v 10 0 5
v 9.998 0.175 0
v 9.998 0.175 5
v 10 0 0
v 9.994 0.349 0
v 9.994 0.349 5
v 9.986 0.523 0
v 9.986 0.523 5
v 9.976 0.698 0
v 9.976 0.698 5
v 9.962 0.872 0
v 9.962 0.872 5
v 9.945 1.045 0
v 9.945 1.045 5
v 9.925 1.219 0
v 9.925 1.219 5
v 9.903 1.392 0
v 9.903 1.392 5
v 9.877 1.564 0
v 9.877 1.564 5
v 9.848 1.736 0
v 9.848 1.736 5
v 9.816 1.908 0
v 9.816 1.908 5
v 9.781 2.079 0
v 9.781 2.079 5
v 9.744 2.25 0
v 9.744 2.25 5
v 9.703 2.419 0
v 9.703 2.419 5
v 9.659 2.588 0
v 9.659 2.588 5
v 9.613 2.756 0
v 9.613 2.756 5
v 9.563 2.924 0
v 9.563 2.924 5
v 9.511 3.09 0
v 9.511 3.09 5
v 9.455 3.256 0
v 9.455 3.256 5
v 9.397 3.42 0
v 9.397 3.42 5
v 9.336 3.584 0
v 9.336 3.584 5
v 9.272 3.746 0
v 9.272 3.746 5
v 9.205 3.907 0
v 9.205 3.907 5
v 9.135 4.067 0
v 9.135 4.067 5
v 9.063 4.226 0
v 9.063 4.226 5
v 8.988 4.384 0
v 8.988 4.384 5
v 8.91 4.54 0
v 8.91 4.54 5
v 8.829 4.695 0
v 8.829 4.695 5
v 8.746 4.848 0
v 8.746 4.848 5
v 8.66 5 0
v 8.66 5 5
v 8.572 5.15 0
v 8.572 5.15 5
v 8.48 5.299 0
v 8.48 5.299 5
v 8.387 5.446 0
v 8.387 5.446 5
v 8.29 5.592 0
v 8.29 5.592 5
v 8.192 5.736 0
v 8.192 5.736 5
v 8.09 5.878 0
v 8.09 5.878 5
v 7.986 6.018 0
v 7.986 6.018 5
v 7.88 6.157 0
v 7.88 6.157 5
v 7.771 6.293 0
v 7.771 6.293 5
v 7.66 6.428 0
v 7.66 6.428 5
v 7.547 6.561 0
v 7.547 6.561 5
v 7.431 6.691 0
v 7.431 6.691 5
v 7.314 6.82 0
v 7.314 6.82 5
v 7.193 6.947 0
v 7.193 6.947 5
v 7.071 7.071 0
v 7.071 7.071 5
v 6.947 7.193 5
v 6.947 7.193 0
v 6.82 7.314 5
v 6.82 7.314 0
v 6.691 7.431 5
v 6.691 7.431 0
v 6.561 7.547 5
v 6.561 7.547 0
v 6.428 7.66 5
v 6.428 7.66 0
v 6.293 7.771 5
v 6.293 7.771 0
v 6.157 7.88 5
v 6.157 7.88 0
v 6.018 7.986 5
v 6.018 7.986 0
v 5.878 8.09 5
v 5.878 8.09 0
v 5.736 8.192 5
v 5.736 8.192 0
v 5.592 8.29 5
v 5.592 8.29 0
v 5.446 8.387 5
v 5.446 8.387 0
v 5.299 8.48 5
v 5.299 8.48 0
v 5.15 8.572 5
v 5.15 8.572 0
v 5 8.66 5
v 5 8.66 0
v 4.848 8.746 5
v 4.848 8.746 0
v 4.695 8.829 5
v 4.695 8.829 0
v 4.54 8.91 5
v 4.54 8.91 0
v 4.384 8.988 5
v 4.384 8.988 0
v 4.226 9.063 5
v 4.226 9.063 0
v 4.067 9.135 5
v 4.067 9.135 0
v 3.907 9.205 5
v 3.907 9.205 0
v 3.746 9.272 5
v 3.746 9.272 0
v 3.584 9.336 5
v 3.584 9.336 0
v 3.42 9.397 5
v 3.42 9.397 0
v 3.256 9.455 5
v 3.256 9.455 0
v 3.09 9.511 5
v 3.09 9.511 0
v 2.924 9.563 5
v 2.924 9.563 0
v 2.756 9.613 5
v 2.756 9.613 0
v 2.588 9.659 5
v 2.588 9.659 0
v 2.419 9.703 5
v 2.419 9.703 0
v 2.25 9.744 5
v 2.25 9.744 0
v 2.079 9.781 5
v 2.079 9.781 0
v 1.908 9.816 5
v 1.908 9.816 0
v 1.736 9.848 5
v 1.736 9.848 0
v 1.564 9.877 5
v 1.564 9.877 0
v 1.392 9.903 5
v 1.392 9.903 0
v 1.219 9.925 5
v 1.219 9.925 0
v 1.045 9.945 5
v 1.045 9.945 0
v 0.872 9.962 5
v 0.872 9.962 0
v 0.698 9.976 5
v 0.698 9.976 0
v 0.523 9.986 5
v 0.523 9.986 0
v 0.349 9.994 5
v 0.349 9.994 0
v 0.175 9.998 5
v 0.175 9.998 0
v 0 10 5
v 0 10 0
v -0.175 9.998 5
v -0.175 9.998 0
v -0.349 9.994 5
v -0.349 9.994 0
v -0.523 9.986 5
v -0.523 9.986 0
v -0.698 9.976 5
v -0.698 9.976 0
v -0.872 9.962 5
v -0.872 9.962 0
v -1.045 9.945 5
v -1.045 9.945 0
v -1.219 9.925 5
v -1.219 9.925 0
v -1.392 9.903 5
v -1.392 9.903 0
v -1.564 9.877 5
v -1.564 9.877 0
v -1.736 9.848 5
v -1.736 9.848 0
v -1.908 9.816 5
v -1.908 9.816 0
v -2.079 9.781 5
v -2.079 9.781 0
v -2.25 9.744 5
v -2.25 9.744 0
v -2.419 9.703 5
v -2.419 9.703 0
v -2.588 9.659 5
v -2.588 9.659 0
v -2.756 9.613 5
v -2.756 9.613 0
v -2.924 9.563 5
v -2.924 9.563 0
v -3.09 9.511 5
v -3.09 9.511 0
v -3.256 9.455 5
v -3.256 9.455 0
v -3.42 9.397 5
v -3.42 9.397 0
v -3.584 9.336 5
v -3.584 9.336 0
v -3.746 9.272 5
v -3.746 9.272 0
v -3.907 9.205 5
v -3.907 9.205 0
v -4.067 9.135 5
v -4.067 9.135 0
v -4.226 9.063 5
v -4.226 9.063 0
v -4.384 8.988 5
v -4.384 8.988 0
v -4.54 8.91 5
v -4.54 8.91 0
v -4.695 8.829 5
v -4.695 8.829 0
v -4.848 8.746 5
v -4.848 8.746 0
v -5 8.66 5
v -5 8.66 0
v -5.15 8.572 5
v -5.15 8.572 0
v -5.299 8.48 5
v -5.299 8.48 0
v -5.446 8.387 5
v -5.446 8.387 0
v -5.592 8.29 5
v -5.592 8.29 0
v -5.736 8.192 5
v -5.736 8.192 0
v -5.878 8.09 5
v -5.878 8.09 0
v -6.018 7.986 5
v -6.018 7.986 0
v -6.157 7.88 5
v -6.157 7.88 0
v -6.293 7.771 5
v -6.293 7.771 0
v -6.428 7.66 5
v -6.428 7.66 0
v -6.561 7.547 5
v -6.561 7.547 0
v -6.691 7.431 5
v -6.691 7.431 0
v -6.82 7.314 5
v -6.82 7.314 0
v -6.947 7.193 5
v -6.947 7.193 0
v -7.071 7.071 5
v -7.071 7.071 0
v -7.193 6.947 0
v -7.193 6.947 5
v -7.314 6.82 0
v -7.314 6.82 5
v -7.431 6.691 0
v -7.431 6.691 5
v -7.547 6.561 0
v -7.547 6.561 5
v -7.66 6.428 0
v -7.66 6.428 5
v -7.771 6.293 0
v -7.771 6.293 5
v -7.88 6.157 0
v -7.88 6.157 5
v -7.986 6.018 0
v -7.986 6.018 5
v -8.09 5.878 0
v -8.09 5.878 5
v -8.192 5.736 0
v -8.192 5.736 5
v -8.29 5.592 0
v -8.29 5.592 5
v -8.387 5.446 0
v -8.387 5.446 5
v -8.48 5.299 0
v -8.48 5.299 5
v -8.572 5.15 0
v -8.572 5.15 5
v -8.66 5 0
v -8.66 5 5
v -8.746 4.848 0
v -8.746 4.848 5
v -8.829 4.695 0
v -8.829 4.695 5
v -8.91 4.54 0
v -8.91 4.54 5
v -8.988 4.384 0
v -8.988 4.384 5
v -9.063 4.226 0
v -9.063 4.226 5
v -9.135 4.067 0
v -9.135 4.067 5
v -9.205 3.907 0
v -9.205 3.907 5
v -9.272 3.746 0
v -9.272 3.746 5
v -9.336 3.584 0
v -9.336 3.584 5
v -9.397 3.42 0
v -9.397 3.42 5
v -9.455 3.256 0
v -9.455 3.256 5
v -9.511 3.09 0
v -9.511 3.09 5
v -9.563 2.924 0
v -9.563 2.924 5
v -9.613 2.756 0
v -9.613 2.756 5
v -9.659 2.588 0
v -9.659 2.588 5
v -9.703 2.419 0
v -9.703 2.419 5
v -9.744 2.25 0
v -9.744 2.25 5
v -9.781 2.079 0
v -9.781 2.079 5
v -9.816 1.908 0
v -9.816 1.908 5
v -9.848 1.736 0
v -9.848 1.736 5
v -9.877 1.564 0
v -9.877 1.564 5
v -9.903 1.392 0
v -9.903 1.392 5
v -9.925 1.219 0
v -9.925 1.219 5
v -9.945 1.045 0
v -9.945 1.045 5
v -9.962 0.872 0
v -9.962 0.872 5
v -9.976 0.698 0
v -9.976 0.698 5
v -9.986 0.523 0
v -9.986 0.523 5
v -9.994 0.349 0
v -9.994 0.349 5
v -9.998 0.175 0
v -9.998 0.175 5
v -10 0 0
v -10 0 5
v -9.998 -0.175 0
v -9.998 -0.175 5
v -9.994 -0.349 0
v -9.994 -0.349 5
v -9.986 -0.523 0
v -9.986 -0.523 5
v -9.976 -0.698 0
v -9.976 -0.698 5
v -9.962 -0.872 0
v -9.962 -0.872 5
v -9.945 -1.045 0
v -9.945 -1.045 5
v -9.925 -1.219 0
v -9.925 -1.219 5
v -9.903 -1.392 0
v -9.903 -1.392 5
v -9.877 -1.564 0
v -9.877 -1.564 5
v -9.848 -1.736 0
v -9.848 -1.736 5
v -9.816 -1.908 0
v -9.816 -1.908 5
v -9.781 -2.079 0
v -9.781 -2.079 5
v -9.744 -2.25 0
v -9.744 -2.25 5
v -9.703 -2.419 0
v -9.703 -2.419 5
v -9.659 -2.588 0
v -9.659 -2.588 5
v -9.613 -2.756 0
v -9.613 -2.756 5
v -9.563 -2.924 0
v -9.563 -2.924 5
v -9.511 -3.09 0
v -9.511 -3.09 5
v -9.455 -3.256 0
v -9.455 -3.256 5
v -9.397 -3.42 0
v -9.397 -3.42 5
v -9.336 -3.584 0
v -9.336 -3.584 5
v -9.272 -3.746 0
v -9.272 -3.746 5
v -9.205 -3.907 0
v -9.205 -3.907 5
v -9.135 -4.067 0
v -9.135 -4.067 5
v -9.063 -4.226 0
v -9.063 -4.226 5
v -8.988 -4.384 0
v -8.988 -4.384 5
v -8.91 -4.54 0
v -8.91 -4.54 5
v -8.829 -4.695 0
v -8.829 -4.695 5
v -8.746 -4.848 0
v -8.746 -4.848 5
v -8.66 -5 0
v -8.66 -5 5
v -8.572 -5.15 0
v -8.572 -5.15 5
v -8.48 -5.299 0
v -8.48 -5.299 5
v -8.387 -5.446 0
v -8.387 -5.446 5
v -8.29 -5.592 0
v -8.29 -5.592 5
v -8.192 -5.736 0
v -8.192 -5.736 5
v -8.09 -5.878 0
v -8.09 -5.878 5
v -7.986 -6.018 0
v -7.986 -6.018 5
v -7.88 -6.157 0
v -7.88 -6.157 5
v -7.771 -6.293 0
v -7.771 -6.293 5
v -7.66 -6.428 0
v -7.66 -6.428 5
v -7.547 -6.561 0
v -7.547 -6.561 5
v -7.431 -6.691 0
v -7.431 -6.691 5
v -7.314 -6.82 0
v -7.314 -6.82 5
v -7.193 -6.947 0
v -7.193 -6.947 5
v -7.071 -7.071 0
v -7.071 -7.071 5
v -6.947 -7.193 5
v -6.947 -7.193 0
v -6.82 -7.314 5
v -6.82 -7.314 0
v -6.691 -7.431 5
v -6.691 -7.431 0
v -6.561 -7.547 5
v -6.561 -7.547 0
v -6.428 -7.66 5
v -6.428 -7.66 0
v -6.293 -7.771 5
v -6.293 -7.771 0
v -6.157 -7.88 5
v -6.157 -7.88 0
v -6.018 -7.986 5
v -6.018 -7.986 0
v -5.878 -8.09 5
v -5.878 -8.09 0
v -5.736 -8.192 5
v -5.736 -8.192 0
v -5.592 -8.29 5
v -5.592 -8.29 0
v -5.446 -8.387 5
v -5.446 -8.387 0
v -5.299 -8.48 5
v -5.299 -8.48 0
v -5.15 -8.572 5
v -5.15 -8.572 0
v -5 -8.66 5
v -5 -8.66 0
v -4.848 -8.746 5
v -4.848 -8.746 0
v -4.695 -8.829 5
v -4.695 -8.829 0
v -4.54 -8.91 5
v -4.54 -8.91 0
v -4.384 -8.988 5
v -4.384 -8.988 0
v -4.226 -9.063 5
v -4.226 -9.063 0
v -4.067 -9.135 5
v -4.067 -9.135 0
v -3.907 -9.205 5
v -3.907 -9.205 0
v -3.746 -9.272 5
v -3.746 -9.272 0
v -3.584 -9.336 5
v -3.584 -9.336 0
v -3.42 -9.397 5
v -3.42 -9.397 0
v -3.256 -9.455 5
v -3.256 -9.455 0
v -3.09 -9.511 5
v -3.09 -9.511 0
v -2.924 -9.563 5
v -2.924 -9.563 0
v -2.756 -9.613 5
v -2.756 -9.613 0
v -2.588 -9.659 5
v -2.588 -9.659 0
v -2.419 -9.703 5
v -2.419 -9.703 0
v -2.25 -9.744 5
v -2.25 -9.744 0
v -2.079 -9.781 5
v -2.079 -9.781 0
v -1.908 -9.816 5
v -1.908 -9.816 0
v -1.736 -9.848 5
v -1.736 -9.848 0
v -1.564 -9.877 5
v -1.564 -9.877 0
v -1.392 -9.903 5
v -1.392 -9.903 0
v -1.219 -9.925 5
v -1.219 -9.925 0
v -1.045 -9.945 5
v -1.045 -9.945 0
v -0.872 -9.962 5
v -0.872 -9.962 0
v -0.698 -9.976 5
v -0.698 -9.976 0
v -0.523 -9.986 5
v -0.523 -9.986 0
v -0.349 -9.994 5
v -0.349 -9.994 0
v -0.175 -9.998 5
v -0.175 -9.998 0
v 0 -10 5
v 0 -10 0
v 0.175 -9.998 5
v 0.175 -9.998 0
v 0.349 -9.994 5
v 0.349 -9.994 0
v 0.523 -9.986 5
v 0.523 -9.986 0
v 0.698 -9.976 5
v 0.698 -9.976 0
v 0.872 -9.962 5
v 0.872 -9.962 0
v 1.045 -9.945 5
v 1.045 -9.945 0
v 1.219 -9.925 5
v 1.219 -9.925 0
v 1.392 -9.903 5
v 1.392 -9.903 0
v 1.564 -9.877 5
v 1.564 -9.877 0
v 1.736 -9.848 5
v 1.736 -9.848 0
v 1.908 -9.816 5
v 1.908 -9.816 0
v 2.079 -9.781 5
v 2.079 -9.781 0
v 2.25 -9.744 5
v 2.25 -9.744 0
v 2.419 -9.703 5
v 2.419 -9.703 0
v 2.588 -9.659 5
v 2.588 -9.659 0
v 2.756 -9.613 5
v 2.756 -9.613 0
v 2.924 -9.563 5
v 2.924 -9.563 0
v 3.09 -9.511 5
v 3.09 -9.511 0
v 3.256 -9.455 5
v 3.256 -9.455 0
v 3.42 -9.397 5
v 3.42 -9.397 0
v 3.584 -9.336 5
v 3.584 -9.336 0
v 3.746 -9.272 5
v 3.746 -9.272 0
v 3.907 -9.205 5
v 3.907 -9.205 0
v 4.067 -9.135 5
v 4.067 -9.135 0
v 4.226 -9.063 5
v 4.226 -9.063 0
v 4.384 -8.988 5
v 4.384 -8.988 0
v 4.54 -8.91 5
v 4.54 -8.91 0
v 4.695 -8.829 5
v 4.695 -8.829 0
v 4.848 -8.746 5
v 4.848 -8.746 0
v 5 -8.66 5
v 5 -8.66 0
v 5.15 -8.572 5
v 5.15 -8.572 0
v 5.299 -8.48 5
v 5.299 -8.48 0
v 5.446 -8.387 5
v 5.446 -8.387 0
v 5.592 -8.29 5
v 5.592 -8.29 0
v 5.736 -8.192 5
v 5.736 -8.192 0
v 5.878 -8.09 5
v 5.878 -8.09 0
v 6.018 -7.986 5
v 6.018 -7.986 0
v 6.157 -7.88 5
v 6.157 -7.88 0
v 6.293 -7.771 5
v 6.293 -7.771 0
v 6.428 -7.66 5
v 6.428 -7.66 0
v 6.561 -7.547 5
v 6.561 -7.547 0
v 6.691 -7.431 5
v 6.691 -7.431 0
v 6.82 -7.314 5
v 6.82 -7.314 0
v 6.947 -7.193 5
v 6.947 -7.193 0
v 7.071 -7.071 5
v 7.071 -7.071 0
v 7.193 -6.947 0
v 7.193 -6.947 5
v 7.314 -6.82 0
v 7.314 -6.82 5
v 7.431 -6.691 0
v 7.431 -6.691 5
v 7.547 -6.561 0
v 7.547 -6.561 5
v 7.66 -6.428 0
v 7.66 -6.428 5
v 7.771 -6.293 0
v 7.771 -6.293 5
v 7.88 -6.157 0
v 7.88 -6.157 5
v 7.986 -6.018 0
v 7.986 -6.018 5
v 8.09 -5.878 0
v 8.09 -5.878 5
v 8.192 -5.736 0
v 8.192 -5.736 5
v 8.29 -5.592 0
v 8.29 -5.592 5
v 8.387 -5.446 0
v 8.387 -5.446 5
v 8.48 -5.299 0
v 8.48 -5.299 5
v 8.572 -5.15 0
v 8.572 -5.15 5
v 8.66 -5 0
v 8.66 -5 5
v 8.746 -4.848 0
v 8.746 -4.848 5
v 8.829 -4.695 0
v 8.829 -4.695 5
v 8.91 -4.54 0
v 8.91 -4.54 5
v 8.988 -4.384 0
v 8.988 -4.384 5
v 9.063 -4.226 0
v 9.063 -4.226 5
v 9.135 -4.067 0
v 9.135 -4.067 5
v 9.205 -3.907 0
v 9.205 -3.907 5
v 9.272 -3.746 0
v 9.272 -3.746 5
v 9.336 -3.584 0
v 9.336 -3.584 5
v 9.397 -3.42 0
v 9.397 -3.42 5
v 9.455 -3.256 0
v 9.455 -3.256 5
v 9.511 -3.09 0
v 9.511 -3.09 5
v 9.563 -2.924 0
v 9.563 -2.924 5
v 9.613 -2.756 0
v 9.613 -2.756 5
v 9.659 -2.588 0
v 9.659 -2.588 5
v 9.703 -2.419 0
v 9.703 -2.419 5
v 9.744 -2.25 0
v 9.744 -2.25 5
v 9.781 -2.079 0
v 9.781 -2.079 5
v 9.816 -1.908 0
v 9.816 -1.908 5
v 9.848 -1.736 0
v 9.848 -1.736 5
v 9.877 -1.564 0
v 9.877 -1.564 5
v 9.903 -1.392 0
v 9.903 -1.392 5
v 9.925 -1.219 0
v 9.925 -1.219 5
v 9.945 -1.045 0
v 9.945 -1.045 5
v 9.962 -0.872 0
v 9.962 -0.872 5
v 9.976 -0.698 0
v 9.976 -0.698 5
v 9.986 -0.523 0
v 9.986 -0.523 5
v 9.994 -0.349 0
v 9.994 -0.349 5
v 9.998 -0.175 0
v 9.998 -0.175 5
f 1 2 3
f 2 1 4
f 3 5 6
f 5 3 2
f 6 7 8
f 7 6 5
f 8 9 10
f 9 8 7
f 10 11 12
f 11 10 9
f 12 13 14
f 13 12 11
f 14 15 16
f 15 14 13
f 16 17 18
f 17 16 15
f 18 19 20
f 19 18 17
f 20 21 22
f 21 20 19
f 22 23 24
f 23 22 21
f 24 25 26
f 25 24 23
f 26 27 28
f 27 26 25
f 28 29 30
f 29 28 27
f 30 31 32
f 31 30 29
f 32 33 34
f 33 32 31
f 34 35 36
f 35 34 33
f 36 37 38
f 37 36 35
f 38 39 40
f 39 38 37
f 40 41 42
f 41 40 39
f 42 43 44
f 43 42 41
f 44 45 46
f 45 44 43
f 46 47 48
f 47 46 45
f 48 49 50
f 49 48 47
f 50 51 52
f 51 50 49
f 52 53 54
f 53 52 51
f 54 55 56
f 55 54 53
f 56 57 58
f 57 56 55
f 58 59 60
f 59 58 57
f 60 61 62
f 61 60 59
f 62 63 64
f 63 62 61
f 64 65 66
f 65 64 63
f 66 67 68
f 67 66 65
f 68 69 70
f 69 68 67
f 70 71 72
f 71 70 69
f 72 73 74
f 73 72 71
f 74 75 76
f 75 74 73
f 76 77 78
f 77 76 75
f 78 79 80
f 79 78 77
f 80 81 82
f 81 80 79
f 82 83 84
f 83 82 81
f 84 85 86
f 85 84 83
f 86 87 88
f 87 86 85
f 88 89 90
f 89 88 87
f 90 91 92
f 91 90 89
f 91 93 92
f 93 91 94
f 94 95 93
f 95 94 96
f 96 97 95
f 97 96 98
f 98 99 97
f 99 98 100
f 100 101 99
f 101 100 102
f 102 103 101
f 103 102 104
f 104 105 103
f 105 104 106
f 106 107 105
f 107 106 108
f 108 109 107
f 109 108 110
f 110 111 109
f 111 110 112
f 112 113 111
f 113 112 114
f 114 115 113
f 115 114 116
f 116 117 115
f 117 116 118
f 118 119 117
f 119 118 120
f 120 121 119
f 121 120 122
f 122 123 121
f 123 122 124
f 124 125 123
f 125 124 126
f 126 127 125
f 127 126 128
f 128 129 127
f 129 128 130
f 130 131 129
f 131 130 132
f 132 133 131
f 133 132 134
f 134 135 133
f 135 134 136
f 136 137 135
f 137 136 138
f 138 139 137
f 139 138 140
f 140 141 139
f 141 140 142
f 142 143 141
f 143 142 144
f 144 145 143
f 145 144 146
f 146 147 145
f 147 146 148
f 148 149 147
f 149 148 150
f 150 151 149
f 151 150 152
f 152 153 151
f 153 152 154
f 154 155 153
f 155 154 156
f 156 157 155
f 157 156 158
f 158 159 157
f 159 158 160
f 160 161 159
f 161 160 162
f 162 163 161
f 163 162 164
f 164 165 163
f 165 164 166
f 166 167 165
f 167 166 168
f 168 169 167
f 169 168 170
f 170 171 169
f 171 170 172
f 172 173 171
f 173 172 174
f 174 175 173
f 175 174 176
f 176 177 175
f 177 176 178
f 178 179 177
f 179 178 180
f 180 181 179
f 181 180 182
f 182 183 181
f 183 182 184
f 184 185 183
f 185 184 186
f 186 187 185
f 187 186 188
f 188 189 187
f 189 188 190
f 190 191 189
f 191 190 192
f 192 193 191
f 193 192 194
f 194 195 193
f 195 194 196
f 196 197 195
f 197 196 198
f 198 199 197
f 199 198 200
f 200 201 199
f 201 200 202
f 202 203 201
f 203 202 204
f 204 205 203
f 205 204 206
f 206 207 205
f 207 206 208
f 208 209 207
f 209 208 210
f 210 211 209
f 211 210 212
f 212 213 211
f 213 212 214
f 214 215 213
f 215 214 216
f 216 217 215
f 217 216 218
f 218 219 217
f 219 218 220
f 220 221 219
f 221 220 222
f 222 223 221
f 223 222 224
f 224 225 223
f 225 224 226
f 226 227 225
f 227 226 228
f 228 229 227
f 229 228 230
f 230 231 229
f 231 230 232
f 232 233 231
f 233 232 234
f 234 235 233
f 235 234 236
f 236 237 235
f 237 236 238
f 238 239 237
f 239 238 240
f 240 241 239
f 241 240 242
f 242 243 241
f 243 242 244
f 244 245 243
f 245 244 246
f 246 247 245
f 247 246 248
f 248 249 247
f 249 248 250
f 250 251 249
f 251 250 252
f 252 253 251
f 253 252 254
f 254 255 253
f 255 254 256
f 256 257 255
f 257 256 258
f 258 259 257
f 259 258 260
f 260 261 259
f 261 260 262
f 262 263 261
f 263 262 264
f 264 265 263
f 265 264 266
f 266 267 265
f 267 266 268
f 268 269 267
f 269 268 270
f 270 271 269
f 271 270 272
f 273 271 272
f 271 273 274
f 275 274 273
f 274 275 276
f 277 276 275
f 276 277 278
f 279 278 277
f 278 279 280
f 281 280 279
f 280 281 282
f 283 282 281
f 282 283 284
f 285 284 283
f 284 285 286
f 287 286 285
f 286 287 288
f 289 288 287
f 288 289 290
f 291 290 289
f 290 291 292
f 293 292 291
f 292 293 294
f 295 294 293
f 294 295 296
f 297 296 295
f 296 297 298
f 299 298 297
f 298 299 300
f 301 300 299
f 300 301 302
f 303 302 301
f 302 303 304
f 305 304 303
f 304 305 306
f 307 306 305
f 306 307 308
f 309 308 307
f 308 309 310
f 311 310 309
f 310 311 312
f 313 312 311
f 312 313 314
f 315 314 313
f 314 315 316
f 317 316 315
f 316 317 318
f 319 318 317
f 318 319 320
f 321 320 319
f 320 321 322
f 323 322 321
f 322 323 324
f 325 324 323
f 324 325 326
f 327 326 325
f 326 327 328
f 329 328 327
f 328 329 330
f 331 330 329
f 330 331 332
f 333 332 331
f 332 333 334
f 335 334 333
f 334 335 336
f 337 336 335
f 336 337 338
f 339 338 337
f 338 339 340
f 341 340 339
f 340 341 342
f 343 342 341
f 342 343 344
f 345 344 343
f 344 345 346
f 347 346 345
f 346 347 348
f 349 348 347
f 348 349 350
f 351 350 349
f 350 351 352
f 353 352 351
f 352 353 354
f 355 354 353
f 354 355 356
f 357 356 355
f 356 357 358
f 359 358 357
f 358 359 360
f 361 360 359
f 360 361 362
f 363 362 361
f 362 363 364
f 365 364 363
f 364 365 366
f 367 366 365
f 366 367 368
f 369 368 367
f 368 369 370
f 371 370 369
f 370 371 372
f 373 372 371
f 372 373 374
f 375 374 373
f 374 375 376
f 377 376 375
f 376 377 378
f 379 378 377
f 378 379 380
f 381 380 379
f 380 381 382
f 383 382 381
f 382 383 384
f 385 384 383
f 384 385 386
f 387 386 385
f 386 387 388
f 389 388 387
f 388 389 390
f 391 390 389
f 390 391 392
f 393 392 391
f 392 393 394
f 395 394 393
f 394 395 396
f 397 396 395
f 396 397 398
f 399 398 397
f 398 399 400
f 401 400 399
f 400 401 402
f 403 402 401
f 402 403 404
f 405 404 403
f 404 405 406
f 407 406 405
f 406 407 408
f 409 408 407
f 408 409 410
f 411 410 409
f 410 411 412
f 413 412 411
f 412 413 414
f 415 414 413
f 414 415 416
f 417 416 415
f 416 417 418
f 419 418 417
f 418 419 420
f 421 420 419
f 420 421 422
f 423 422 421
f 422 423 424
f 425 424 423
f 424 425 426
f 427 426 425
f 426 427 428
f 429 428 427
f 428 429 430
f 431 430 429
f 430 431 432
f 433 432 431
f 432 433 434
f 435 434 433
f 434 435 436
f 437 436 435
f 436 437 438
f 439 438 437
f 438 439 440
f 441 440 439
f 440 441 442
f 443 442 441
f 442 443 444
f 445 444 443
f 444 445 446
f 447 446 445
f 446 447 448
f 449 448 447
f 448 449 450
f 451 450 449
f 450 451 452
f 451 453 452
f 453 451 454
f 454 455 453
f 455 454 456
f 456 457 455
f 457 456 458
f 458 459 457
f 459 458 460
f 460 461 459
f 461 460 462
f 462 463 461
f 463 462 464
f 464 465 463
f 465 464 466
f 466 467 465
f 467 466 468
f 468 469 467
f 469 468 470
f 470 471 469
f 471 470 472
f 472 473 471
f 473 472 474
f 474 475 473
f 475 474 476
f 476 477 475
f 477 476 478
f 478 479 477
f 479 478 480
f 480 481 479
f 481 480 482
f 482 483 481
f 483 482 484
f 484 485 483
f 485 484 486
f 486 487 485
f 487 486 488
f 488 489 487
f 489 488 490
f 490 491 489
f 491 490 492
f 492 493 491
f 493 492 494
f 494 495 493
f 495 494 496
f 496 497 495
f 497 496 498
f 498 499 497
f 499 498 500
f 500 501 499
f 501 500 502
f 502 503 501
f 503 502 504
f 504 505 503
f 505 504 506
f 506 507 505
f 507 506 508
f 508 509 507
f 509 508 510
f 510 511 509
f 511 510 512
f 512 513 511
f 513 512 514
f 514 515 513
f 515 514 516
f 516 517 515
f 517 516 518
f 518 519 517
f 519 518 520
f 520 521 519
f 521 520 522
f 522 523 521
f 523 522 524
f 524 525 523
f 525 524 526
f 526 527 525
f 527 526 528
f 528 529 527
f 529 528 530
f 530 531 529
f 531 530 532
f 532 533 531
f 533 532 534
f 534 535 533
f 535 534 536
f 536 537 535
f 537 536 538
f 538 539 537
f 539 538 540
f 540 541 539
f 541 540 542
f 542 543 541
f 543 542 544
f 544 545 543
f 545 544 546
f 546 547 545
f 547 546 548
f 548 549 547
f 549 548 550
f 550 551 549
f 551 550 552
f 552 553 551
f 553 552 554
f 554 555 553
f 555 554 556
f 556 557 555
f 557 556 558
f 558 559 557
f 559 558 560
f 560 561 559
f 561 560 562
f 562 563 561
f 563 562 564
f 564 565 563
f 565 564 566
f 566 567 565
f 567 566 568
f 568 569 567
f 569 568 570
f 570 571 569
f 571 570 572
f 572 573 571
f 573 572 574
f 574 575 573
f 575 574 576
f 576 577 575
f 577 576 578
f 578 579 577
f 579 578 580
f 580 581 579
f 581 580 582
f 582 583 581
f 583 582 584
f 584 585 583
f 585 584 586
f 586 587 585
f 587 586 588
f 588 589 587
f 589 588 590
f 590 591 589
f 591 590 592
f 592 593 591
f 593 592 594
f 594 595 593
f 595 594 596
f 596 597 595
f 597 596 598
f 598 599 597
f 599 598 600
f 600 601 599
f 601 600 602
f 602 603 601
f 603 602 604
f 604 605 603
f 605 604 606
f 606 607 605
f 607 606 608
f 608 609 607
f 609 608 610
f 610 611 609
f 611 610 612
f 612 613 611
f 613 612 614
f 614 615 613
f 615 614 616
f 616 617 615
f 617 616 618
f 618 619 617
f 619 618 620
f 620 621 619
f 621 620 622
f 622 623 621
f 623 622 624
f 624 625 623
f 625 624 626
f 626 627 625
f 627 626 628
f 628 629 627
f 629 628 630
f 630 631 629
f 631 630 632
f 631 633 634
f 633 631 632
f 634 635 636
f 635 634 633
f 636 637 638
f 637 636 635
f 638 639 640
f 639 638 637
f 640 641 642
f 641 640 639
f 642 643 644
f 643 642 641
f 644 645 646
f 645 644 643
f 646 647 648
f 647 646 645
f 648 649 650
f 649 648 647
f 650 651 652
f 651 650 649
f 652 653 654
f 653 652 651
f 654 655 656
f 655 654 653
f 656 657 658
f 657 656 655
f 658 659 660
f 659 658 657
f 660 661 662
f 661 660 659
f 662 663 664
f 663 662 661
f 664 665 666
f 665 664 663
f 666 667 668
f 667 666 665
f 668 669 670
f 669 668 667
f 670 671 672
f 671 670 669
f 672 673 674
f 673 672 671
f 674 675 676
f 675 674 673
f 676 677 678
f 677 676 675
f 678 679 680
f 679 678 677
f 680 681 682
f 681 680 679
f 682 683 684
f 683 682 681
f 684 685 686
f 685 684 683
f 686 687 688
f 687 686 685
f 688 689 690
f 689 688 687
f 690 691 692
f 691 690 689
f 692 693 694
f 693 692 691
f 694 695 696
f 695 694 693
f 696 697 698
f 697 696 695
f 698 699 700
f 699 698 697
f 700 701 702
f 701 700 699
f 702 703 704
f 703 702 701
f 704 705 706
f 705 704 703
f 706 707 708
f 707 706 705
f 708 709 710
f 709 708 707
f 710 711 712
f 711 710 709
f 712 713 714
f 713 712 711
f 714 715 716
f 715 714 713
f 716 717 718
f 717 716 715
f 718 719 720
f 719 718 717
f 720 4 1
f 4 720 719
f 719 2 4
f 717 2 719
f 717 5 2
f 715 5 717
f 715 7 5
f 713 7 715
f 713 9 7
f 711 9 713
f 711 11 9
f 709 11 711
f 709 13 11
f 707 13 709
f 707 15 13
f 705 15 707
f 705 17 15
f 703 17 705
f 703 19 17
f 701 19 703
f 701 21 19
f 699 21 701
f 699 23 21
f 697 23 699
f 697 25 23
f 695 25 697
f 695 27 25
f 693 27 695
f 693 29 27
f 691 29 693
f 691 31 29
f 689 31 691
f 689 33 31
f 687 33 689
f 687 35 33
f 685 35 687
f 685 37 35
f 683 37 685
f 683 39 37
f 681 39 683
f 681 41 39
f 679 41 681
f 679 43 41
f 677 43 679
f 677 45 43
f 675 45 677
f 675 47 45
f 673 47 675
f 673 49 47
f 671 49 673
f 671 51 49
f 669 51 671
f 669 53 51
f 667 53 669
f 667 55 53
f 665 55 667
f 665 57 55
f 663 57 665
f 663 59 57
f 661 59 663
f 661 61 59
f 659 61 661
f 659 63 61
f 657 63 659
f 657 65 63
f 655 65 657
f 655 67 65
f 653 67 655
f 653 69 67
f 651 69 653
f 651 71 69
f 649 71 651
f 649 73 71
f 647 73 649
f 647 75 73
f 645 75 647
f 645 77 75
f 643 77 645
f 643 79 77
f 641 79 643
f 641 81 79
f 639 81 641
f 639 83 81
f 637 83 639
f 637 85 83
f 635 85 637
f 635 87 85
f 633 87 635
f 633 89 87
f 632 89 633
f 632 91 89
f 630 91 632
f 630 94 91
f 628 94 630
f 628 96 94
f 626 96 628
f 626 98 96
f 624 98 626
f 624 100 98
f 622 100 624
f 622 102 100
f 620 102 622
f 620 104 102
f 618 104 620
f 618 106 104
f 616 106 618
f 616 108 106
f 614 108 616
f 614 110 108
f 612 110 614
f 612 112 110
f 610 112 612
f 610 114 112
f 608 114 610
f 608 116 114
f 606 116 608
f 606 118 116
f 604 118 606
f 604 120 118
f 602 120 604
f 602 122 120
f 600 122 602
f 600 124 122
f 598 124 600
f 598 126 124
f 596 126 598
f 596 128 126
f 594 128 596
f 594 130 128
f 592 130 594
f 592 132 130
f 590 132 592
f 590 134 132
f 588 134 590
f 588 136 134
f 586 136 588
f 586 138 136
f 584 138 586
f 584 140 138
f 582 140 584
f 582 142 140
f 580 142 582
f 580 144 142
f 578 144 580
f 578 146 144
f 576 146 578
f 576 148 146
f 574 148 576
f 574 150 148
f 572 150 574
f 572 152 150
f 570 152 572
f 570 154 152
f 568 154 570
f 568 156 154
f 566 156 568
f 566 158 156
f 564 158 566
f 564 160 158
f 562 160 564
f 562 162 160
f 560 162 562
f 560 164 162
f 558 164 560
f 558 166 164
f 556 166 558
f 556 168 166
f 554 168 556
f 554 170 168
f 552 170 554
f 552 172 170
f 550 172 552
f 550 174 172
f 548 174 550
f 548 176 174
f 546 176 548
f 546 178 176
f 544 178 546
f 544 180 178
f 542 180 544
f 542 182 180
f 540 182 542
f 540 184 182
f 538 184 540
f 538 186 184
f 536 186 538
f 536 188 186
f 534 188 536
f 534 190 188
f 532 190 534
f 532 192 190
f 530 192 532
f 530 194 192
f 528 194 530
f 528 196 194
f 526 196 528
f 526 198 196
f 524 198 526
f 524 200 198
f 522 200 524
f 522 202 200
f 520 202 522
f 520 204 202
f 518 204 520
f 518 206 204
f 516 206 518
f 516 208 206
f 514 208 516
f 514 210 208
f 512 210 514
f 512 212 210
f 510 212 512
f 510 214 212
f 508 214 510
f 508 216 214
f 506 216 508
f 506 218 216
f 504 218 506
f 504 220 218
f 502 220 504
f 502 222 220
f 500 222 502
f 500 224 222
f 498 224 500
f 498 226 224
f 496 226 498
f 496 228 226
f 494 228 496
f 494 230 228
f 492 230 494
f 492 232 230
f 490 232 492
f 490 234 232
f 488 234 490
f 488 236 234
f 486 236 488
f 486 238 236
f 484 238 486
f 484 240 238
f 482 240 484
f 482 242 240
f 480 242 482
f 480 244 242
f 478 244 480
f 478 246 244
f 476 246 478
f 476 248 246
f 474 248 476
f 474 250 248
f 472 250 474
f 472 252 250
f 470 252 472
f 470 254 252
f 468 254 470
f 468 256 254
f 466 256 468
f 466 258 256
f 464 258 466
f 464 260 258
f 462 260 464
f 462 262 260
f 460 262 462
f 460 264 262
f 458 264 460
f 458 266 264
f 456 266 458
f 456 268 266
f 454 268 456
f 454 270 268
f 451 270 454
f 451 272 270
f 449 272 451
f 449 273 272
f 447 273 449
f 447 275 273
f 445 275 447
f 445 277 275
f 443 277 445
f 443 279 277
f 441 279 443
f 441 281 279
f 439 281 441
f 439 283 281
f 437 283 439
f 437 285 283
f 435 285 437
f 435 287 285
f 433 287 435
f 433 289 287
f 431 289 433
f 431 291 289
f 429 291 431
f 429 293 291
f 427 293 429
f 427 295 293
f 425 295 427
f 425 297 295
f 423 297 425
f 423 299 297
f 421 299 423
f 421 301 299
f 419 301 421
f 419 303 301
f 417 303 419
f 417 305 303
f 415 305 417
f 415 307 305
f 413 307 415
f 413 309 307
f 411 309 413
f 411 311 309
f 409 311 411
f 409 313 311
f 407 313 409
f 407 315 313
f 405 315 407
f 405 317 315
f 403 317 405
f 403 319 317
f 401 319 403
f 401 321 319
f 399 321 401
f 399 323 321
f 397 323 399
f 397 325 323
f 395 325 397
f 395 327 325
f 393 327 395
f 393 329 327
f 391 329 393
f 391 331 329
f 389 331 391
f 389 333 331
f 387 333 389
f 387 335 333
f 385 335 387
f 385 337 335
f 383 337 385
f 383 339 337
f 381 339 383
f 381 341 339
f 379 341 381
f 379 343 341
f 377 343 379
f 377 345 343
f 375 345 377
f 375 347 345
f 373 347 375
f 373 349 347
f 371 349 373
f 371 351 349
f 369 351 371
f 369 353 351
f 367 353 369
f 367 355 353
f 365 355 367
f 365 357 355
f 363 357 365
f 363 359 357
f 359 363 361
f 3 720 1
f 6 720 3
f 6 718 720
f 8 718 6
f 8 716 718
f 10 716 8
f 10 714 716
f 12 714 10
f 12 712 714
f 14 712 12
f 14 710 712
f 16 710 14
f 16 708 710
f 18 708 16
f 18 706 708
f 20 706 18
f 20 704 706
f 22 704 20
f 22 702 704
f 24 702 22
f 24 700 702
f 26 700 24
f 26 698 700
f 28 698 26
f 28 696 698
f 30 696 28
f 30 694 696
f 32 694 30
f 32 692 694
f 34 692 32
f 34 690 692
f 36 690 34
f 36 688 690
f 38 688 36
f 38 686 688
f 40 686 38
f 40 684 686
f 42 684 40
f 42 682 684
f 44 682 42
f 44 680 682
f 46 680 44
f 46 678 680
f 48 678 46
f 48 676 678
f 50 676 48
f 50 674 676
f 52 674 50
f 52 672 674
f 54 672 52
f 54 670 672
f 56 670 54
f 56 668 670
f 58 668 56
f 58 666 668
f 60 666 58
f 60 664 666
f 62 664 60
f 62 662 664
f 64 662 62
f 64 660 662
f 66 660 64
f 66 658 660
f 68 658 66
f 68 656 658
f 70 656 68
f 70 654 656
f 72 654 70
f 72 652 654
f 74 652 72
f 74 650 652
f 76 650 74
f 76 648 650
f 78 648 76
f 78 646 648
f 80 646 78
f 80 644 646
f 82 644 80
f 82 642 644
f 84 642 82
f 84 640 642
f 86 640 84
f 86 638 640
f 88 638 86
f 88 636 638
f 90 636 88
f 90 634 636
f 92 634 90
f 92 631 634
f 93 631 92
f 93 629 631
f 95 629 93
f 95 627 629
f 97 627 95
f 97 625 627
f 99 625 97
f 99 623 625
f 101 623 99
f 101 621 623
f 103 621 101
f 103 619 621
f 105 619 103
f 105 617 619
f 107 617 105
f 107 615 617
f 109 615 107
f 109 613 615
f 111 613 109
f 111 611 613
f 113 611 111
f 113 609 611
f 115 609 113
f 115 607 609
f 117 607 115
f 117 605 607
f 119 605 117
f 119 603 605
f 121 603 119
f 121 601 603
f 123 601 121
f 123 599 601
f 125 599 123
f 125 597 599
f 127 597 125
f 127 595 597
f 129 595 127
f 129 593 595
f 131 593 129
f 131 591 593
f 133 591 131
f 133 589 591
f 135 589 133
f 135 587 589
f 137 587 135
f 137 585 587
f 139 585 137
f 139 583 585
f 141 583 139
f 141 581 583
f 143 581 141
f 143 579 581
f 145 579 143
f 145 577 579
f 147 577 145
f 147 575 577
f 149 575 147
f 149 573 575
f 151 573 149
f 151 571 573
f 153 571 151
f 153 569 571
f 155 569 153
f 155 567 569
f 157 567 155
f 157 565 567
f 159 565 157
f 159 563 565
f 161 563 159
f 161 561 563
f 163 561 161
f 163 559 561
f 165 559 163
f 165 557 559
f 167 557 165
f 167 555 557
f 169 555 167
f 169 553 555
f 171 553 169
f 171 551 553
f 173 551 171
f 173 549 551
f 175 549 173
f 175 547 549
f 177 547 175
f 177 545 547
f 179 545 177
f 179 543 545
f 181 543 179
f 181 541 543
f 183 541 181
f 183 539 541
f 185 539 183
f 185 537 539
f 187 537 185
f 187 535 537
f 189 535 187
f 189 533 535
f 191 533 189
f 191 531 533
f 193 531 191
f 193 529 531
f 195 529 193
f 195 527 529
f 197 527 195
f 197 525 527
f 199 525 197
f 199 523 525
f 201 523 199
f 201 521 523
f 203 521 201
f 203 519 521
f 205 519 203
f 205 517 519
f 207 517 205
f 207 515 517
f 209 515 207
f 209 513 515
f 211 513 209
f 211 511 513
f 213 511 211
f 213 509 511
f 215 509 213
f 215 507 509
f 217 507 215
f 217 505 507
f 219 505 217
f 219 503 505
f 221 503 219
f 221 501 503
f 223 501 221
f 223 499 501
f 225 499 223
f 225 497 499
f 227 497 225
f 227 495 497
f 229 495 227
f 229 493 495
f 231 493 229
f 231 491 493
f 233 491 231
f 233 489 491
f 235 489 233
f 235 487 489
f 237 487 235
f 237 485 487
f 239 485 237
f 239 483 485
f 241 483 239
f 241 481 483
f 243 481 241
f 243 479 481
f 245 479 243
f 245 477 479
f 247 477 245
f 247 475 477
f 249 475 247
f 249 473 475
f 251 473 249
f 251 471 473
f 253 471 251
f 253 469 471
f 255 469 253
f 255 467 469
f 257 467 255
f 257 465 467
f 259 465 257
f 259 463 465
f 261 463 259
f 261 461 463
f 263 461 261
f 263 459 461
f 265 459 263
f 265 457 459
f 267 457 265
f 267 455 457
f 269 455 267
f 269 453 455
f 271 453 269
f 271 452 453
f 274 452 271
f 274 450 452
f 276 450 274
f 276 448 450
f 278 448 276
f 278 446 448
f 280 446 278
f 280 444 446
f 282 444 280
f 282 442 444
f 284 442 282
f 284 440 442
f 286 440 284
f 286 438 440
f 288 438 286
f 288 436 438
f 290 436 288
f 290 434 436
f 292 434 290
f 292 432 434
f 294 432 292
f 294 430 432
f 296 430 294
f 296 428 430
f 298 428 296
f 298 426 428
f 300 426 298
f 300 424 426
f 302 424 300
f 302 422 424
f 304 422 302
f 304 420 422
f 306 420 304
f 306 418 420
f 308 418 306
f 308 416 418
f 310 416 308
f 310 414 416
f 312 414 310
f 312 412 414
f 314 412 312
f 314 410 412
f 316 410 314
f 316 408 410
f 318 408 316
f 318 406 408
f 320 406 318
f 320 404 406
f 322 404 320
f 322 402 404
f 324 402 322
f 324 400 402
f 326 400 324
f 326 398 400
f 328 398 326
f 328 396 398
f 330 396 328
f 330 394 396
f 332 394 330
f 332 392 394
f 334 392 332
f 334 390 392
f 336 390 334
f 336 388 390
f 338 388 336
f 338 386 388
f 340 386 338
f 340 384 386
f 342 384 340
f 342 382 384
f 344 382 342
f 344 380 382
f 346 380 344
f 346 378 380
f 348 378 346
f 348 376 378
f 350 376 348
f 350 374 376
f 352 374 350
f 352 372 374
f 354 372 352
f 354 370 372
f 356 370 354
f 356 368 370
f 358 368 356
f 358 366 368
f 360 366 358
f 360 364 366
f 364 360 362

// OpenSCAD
// expect: slow, above all on a phone
$fn = 360;
cylinder(d = 20, h = 5);
